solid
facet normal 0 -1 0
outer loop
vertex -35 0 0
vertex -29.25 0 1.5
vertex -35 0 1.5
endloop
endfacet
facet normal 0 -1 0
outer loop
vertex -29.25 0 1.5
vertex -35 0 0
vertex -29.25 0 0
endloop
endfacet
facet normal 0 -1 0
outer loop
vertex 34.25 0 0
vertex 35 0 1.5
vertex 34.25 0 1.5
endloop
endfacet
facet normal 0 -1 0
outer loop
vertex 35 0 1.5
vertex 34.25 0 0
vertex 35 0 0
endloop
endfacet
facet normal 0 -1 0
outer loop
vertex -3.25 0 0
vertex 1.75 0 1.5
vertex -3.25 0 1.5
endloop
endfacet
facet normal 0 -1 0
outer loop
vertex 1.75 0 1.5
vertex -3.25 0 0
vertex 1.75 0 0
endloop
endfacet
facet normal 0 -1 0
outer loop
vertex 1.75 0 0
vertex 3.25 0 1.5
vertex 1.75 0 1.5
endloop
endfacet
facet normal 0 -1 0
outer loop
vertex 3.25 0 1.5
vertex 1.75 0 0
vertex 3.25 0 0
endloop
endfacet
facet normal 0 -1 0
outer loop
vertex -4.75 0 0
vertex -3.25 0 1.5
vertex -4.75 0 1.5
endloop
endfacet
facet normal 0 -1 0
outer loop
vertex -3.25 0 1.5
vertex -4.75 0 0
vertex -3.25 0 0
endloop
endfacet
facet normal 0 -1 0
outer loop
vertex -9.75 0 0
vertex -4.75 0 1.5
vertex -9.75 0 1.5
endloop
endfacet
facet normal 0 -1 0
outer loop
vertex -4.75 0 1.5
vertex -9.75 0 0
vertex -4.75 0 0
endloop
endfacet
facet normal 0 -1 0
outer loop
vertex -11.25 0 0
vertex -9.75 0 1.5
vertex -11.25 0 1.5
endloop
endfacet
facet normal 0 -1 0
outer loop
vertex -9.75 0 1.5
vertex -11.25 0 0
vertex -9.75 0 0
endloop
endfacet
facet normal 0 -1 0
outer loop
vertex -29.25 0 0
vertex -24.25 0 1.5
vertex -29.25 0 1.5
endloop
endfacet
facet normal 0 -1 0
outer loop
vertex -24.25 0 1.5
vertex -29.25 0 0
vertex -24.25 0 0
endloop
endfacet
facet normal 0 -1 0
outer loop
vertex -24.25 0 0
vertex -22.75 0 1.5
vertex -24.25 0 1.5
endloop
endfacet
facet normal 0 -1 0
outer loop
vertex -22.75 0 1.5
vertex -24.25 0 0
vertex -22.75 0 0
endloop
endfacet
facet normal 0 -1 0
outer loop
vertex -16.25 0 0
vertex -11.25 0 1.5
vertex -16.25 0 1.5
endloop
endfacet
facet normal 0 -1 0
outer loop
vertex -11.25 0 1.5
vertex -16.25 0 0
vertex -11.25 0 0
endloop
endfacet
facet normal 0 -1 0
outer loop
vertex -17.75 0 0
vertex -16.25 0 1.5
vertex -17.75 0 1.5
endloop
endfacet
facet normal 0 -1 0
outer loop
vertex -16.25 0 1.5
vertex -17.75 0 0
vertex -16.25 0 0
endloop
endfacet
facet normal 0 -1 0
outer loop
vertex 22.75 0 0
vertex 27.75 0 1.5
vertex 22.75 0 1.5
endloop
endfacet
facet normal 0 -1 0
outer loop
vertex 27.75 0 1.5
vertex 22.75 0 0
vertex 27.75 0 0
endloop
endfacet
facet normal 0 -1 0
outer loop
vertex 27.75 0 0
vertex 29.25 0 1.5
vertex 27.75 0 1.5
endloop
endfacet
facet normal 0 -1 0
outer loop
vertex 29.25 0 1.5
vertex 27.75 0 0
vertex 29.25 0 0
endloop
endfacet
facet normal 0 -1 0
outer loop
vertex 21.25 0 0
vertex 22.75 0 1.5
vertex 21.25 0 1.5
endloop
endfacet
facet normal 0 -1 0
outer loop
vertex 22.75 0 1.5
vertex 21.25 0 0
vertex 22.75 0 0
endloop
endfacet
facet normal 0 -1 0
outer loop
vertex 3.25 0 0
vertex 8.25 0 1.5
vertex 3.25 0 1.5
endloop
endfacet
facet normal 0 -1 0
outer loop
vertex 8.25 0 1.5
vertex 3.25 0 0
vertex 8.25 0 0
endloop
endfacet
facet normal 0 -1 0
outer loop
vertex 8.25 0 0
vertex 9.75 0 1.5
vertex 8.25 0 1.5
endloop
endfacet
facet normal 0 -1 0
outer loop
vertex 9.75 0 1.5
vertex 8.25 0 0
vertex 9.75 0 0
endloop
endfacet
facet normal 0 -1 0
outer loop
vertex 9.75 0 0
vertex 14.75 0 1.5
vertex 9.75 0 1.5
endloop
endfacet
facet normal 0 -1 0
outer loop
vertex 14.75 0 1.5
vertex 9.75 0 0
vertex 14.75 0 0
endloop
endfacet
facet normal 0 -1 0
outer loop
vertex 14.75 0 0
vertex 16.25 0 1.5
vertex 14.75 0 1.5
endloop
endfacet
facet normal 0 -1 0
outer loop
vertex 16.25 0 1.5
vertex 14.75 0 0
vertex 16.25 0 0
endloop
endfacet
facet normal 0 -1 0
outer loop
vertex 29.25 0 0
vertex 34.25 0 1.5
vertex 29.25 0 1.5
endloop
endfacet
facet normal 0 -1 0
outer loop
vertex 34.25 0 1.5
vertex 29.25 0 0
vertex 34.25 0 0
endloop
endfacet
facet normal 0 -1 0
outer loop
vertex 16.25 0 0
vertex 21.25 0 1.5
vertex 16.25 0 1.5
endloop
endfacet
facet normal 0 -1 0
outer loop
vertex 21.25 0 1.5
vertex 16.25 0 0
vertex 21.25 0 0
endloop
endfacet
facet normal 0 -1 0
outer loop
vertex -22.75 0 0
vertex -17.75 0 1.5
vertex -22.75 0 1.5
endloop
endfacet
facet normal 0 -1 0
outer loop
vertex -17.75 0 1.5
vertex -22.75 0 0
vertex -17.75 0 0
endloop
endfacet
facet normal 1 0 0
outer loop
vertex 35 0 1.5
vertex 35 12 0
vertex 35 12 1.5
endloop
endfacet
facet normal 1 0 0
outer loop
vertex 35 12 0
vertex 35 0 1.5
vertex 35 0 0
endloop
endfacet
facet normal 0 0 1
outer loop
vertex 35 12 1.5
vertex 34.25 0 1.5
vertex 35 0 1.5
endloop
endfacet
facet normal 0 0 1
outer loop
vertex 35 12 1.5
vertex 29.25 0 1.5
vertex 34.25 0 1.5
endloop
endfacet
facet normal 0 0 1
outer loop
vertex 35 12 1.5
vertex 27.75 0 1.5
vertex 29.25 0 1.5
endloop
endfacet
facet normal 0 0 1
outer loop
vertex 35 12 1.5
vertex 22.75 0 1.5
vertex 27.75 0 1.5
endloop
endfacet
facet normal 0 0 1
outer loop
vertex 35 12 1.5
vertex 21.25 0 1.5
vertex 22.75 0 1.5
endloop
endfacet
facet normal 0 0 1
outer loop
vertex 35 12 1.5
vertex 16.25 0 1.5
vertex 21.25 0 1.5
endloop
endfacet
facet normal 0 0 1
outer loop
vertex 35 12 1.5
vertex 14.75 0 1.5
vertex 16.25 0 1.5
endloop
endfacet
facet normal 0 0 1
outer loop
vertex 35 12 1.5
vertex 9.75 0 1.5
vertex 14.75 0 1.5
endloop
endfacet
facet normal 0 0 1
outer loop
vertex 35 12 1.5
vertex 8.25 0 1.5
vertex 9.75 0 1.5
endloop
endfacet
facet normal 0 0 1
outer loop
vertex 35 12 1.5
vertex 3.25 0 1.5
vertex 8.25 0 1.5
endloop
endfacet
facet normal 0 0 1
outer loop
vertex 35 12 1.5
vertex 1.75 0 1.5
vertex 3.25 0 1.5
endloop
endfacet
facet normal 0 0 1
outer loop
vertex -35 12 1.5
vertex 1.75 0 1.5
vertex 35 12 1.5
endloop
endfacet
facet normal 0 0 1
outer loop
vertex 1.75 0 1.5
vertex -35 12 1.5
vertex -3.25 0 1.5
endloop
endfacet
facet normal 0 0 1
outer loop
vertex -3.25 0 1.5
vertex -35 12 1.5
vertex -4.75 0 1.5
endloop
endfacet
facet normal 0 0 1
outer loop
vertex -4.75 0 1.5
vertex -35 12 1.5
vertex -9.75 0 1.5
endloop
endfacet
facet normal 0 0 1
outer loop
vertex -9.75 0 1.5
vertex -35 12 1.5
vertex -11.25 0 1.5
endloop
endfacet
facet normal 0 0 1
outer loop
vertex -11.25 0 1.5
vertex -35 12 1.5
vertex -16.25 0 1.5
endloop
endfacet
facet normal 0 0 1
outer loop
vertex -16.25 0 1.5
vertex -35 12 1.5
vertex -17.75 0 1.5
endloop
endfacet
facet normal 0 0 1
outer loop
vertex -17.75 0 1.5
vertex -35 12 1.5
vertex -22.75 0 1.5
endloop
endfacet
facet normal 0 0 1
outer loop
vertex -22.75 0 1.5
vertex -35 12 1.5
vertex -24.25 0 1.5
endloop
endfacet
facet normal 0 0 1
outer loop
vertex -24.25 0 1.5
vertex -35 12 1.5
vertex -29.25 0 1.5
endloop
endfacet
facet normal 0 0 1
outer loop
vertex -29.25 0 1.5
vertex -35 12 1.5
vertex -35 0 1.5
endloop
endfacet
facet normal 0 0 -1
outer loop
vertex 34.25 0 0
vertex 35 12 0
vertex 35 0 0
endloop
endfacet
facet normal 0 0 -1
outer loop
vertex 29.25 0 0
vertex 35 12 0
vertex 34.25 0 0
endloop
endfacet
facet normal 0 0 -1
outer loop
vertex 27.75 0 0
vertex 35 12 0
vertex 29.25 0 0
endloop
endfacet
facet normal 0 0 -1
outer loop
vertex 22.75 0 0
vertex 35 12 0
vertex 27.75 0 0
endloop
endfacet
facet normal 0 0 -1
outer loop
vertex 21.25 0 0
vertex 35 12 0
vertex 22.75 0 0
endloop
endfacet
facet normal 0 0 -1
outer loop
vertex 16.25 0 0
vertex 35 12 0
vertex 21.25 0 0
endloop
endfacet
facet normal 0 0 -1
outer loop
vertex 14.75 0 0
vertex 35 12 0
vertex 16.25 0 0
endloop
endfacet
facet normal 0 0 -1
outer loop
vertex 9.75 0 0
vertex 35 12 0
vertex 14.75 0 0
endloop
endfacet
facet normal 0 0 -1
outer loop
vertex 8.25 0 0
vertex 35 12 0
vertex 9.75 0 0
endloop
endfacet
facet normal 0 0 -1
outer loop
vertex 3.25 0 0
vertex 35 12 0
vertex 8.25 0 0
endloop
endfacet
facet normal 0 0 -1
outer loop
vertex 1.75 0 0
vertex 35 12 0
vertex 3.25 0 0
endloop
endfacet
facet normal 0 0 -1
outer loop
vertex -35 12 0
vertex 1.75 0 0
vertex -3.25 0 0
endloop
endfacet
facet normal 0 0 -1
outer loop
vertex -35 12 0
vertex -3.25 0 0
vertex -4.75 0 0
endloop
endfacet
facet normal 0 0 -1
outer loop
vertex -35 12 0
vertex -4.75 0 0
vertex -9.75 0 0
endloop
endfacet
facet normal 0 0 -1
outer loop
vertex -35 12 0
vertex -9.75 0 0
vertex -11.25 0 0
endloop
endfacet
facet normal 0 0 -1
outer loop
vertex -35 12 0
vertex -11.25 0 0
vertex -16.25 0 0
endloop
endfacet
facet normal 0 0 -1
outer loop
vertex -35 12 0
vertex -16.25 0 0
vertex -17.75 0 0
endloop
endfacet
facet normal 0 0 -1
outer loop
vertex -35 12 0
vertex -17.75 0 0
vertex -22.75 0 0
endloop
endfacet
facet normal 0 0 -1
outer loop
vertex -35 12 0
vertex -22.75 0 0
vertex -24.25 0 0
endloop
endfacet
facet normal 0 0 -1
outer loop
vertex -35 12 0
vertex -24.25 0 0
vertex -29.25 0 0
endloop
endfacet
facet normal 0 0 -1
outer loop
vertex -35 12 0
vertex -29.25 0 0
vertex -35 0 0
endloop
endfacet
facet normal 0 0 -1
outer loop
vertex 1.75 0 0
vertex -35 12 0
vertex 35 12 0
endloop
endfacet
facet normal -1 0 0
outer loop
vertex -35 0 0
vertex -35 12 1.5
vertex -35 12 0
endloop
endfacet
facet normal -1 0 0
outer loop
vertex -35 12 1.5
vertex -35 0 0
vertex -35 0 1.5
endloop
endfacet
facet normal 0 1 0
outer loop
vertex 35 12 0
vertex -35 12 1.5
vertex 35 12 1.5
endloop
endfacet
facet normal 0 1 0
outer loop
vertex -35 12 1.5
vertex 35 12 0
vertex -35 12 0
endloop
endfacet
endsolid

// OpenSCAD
// 10-well comb for casting agarose gels
// Print orientation: flat on bed, teeth pointing down (-Z)

// ---------- Parameters ----------
plate_t      = 1.5;    // plate thickness (Z)
spine_len    = 70;     // spine length (X)
spine_w      = 12;     // spine width (Y)
tooth_count  = 10;     // number of teeth
tooth_w      = 5.0;    // tooth width (X)
tooth_len    = 12;     // tooth length (Y)
tooth_h      = 12;     // tooth height from spine (-Y)
pitch        = tooth_w + 1.5;  // centre-to-centre spacing (X)
eps          = 0.5;    // cutter overshoot past faces

$fn = 64;

// ---------- Model ----------
difference() {
    // Base plate
    translate([-spine_len/2, 0, 0])
        cube([spine_len, spine_w, plate_t]);

    // Teeth row, centred on spine in X
    for (i = [0 : tooth_count - 1])
        translate([(i - (tooth_count - 1)/2) * pitch, -tooth_h, 0])
            cube([tooth_w, tooth_len, plate_t + eps]);
}
